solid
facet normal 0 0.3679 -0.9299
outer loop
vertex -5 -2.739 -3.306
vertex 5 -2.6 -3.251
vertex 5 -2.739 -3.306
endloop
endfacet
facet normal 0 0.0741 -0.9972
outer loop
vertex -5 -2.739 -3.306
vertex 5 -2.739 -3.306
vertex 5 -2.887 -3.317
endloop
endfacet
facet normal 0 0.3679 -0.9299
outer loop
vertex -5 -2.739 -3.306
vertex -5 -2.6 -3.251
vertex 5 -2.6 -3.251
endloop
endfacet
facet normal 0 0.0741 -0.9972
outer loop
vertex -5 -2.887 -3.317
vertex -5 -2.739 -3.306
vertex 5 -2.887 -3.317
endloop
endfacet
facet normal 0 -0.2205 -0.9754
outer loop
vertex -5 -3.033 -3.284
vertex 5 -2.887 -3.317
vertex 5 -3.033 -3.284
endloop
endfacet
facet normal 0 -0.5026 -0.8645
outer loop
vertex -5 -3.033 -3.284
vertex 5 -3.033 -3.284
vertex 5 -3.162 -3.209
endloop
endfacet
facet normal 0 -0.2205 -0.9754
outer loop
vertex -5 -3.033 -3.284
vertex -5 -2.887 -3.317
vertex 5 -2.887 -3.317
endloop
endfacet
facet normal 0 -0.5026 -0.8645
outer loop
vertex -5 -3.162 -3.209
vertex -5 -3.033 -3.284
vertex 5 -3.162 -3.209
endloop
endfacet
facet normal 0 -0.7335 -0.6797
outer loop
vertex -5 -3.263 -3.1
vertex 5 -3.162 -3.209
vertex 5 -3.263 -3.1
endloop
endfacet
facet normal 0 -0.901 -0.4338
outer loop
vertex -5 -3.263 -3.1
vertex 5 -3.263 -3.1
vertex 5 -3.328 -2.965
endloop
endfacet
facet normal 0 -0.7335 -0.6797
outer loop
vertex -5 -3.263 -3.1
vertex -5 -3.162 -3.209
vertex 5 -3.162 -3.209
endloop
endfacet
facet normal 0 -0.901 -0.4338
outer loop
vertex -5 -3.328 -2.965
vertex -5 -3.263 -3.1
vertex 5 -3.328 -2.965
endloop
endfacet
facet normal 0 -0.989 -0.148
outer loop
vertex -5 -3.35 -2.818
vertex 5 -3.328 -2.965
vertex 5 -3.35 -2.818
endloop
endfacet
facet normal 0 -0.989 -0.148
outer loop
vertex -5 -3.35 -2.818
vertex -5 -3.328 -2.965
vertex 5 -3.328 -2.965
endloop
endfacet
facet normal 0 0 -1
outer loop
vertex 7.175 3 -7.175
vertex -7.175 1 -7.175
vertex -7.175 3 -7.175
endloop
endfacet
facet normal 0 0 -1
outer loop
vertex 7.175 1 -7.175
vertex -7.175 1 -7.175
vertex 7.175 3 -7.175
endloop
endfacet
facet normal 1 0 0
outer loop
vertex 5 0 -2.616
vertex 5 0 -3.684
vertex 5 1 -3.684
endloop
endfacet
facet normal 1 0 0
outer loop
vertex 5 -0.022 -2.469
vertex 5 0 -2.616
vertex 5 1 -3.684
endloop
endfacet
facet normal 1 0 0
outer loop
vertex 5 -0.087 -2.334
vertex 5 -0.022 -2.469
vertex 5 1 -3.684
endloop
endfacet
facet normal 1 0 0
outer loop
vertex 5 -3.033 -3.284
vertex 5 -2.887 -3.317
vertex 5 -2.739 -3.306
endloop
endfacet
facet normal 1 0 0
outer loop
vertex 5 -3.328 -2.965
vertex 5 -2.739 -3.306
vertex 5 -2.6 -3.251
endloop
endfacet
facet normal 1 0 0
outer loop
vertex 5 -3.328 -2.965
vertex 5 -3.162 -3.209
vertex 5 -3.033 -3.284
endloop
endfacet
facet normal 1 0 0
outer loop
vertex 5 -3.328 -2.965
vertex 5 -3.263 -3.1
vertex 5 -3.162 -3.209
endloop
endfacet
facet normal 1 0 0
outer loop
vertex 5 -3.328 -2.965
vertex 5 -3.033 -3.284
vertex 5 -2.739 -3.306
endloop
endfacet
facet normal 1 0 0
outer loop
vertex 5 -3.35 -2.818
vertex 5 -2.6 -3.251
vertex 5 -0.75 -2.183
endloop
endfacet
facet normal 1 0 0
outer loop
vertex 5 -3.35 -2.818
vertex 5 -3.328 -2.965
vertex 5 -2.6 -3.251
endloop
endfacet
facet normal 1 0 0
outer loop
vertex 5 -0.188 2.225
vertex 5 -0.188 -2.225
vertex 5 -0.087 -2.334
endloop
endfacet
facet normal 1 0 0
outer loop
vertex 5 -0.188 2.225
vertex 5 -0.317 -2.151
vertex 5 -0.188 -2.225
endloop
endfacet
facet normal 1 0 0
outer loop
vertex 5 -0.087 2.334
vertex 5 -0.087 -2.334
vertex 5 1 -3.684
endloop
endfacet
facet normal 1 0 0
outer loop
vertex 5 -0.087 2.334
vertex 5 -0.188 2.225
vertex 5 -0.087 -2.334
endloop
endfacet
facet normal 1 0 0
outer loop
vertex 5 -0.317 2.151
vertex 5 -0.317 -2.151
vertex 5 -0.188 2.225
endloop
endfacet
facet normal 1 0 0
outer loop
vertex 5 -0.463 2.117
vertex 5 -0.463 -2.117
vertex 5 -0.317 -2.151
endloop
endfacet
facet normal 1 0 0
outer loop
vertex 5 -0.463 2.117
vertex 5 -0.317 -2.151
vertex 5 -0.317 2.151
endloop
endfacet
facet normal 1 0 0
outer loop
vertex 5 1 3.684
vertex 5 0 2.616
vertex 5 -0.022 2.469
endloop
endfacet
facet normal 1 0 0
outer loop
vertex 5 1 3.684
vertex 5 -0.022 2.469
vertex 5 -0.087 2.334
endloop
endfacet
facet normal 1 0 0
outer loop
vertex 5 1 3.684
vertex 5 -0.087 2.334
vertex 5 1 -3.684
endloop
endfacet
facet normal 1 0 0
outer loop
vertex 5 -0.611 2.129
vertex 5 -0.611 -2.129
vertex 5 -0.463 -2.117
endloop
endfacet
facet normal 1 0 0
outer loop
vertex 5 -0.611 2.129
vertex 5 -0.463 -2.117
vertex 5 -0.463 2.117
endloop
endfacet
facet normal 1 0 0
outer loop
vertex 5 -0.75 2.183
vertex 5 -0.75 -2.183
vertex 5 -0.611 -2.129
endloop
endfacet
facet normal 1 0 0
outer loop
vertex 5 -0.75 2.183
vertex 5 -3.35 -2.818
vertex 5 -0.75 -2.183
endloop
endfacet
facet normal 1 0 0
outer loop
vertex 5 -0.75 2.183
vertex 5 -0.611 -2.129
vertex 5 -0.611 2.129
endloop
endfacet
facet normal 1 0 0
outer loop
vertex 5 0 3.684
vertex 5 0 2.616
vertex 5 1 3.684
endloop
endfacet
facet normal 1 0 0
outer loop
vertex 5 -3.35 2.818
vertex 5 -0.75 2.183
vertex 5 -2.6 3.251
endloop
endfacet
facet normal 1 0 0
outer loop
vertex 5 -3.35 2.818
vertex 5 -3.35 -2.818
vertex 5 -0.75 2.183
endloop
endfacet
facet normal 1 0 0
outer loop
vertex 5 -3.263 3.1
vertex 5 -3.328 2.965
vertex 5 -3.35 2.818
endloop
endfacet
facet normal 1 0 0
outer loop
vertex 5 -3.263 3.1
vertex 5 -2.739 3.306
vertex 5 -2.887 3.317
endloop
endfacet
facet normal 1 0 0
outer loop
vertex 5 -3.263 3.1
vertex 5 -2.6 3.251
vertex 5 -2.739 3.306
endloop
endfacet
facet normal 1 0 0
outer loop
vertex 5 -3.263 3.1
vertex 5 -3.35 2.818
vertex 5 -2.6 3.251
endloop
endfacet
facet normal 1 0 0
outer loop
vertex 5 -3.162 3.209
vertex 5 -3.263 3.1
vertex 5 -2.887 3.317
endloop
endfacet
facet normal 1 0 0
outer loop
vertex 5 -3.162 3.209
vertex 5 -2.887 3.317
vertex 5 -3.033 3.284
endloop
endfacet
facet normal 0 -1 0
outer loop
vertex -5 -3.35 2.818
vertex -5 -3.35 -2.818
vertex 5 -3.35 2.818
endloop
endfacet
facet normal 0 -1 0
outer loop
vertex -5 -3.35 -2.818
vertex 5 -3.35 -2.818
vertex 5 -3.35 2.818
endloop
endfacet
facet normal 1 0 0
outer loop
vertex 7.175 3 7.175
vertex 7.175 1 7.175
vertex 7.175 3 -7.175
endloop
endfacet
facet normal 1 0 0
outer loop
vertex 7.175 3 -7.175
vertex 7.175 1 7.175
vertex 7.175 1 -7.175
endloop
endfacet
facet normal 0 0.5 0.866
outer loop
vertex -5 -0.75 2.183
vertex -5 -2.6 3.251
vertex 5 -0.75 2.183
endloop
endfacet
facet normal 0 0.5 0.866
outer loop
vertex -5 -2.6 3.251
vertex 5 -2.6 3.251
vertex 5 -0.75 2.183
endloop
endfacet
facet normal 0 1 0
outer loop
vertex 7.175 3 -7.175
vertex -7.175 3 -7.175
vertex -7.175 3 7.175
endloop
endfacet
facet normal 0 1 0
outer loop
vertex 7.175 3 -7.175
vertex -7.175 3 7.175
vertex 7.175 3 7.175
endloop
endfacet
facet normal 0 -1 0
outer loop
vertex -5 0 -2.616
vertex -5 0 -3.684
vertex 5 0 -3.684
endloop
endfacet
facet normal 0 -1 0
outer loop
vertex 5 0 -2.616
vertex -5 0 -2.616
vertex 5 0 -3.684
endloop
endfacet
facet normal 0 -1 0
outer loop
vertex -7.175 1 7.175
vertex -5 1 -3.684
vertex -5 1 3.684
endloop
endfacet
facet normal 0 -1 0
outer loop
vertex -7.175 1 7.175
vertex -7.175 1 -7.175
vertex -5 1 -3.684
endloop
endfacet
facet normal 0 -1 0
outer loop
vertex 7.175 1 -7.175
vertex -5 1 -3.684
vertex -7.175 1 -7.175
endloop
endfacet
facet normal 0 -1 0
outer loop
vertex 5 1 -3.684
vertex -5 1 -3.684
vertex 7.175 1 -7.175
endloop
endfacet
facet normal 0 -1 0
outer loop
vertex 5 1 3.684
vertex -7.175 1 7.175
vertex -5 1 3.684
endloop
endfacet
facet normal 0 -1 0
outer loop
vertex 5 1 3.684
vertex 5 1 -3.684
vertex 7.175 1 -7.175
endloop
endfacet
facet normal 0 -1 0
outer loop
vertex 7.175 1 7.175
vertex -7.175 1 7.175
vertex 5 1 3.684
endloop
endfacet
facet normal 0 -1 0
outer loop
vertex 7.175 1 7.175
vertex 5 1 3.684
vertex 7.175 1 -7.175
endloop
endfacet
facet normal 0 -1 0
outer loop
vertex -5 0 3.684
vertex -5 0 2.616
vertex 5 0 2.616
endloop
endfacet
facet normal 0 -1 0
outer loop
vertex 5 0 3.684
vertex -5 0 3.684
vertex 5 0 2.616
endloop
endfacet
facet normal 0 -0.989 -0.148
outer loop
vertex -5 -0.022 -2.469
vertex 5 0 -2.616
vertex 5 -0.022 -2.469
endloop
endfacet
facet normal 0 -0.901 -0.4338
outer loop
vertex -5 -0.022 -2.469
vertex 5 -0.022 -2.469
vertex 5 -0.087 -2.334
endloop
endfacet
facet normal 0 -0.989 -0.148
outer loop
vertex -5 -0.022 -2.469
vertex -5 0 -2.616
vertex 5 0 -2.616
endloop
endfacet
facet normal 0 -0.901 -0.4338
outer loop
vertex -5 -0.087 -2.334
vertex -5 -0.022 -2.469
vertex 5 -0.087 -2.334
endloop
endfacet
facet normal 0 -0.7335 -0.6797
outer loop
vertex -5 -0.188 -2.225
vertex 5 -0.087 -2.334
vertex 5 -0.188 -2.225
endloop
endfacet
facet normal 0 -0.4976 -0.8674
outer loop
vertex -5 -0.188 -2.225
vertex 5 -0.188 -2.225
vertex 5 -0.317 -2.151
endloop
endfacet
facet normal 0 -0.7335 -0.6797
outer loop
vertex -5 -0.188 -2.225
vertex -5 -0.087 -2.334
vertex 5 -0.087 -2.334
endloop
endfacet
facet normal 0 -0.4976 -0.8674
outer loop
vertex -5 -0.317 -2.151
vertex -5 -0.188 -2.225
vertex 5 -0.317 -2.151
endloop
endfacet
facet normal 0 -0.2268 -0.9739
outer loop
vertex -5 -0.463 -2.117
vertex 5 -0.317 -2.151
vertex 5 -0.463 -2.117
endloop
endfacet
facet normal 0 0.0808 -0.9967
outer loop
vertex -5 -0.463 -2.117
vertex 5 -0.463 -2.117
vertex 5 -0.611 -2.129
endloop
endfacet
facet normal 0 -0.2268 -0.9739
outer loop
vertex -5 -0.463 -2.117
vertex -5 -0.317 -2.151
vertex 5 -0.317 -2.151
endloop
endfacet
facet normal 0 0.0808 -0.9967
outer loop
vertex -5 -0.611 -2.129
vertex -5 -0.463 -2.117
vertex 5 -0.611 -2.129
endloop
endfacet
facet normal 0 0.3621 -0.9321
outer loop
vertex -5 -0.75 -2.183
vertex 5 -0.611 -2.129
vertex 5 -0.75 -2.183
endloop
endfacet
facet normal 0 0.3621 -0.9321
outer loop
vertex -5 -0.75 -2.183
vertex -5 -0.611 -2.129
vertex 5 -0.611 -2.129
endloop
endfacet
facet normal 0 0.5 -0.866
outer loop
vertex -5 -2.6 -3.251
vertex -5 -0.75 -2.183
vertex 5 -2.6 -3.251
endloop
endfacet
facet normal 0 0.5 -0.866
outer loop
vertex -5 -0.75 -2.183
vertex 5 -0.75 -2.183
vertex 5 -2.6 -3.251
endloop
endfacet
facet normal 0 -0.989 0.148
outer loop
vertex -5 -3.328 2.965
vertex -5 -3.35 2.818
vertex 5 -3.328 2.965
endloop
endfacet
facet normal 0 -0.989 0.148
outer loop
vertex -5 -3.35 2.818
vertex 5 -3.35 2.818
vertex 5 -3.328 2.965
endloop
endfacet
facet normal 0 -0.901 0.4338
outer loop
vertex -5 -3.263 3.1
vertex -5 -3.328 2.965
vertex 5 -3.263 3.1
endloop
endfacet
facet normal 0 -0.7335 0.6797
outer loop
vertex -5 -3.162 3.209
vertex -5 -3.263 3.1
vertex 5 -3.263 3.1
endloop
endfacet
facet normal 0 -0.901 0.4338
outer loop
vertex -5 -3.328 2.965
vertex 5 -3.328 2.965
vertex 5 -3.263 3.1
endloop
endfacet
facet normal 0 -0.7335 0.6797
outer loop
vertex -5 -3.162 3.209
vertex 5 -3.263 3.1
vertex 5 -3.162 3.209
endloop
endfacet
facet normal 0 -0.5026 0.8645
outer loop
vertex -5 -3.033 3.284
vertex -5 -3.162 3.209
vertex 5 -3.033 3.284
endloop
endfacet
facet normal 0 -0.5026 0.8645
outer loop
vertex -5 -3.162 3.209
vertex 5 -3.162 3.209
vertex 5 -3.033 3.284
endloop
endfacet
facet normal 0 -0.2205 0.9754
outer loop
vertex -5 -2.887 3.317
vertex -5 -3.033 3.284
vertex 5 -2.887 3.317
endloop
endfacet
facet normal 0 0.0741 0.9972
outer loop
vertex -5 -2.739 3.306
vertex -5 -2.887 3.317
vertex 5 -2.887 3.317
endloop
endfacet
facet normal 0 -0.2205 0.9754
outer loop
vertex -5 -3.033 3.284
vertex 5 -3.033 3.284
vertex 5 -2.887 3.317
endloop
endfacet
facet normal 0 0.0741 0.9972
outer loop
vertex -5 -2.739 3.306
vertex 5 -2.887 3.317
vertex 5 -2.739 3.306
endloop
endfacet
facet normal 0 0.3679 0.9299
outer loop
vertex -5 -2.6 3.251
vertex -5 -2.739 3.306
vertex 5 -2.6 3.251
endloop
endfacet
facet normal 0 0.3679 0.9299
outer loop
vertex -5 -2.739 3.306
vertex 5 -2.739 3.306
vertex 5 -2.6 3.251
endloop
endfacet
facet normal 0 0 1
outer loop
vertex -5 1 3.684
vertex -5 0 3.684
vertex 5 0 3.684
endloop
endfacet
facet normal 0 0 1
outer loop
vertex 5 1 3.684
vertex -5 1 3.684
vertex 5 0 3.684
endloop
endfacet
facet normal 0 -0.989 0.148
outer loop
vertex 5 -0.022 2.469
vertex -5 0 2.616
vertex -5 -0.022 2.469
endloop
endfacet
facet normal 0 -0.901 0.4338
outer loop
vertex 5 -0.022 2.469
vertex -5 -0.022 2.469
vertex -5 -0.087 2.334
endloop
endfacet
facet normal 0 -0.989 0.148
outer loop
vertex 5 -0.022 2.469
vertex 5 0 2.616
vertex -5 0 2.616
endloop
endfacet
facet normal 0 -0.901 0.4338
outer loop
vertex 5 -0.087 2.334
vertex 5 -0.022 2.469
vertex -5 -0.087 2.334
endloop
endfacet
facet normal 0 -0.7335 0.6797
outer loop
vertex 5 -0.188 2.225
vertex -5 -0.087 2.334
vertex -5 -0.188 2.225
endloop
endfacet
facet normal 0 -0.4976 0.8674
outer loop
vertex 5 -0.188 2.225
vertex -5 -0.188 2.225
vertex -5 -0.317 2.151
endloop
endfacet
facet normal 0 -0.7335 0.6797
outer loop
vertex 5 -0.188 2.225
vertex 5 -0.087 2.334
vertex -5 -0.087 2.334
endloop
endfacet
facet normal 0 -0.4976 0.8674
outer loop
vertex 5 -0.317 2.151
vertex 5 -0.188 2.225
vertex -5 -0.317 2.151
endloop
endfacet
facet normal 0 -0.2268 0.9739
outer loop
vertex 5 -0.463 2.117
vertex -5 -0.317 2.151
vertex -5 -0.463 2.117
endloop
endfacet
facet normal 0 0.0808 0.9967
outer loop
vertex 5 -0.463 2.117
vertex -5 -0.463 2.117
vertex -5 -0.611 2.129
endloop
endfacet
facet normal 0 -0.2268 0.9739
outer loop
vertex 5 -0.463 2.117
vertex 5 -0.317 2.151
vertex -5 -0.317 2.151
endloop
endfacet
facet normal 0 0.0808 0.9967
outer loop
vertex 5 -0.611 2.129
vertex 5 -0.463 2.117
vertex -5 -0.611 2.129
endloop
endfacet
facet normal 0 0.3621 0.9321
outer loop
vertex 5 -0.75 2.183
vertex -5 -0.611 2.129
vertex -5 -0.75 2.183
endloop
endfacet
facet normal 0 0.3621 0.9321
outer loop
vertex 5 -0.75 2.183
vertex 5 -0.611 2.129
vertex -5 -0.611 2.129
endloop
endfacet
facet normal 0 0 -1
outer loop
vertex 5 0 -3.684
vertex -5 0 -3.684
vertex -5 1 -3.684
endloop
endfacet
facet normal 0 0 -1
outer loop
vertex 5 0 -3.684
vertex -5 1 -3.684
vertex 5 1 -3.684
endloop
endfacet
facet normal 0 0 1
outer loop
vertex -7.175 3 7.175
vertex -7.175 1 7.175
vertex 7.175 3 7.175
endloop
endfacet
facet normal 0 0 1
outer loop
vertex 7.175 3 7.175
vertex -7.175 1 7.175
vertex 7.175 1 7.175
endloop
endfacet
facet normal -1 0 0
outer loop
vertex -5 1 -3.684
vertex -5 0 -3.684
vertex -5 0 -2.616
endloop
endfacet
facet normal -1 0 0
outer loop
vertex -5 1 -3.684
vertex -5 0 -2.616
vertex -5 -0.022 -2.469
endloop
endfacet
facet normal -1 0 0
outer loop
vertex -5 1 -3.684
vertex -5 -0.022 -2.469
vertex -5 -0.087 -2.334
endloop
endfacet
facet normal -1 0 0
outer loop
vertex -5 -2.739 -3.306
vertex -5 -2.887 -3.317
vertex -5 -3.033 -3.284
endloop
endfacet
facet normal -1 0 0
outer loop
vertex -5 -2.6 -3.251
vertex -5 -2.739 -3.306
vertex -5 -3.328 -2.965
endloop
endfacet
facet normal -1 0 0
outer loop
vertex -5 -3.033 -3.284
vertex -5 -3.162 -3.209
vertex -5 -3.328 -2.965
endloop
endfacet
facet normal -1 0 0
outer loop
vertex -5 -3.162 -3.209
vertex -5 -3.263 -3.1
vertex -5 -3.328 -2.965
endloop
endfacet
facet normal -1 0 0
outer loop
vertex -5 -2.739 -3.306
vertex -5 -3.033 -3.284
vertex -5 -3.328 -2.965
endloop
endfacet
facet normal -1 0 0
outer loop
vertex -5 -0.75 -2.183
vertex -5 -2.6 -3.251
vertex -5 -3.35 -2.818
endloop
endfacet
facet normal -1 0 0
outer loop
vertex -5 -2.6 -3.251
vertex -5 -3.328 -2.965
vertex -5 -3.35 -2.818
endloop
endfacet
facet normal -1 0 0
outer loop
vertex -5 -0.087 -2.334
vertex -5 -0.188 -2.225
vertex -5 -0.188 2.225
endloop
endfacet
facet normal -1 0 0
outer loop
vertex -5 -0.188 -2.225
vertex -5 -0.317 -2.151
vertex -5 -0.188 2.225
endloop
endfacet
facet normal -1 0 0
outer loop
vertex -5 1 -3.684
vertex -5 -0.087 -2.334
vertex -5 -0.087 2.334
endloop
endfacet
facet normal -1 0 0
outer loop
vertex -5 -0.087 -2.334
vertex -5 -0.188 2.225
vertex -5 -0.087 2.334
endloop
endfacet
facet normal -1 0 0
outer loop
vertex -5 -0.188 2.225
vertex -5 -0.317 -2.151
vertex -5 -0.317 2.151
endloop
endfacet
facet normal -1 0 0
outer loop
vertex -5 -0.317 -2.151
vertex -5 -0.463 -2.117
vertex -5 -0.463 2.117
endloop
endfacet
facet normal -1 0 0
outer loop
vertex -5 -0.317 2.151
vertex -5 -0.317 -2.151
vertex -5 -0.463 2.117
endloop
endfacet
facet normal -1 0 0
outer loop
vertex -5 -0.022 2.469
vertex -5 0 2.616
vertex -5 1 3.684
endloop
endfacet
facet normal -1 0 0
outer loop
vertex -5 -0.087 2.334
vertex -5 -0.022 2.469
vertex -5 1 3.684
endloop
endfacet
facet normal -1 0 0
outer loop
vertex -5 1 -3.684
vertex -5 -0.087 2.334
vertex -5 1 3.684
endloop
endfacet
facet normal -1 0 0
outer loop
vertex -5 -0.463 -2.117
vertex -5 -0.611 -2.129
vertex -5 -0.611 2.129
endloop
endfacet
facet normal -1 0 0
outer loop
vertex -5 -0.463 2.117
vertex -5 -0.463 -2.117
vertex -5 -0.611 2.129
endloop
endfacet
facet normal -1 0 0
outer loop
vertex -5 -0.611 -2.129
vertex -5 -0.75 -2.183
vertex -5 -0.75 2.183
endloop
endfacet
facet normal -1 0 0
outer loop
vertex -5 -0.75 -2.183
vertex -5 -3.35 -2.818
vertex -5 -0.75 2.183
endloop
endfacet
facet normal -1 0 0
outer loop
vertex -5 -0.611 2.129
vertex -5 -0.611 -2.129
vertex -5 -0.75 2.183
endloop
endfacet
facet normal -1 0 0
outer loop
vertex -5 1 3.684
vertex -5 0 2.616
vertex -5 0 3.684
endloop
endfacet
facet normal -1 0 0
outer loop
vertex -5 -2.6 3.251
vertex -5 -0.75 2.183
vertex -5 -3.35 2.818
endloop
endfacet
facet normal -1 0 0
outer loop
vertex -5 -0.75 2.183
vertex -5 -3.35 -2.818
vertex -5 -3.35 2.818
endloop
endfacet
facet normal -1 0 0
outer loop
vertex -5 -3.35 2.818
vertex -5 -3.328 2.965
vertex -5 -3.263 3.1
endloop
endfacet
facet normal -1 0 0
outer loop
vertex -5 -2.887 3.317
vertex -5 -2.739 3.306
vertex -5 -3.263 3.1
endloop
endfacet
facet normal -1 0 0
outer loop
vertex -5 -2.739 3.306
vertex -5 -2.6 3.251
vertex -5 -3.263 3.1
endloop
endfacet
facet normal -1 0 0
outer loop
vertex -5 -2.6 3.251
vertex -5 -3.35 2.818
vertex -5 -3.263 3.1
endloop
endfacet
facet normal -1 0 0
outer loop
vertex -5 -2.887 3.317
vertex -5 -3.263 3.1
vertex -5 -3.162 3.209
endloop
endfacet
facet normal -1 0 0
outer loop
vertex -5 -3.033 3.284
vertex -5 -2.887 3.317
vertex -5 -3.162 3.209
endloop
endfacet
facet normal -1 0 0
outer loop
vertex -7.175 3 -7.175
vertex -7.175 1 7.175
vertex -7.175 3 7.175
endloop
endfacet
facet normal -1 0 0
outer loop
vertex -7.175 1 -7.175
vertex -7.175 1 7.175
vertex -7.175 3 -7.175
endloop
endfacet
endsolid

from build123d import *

# Parameters (mm, degrees)
SKETCH2_W           = 14.35
SKETCH2_H           = 14.35
BOSS_EXTRUDE1_DEPTH = 3
BOSS_EXTRUDE2_DEPTH = 5
SKETCH4_W           = 14.35
SKETCH4_H           = 14.35
SKETCH4_W_2         = 10
SKETCH4_H_2         = 7.368246804
CUT_EXTRUDE1_DEPTH  = 1
FILLET1_R           = 0.5


with BuildPart() as part:
    # Sketch2 → Boss-Extrude1 (new body)
    with BuildSketch(Plane(origin=(0, 0, 0), x_dir=(1, 0, 0), z_dir=(0, 1, 0))):
        Rectangle(SKETCH2_W, SKETCH2_H)
    extrude(amount=BOSS_EXTRUDE1_DEPTH)

    # Sketch3 → Boss-Extrude2 (add, symmetric)
    with BuildSketch(Plane(origin=(0, 0, 0), x_dir=(0, 0, -1), z_dir=(1, 0, 0))):
        Polygon((-1.75, 0), (1.75, 0), (3.684123402, -3.35), (-3.684123402, -3.35), align=None)
    extrude(amount=BOSS_EXTRUDE2_DEPTH, both=True)

    # Sketch4 → Cut-Extrude1 (cut)
    with BuildSketch(Plane.XZ):
        Rectangle(SKETCH4_W, SKETCH4_H)
        Rectangle(SKETCH4_W_2, SKETCH4_H_2, mode=Mode.SUBTRACT)
    extrude(amount=-CUT_EXTRUDE1_DEPTH, mode=Mode.SUBTRACT)

    # Fillet1
    fillet1_edges = [part.edges().sort_by_distance(p)[0] for p in [
        (0, -3.35, -3.684123402),
        (0, 0, -1.75),
        (0, 0, 1.75),
        (0, -3.35, 3.684123402),
    ]]
    fillet(fillet1_edges, radius=FILLET1_R)


solid = part.part
